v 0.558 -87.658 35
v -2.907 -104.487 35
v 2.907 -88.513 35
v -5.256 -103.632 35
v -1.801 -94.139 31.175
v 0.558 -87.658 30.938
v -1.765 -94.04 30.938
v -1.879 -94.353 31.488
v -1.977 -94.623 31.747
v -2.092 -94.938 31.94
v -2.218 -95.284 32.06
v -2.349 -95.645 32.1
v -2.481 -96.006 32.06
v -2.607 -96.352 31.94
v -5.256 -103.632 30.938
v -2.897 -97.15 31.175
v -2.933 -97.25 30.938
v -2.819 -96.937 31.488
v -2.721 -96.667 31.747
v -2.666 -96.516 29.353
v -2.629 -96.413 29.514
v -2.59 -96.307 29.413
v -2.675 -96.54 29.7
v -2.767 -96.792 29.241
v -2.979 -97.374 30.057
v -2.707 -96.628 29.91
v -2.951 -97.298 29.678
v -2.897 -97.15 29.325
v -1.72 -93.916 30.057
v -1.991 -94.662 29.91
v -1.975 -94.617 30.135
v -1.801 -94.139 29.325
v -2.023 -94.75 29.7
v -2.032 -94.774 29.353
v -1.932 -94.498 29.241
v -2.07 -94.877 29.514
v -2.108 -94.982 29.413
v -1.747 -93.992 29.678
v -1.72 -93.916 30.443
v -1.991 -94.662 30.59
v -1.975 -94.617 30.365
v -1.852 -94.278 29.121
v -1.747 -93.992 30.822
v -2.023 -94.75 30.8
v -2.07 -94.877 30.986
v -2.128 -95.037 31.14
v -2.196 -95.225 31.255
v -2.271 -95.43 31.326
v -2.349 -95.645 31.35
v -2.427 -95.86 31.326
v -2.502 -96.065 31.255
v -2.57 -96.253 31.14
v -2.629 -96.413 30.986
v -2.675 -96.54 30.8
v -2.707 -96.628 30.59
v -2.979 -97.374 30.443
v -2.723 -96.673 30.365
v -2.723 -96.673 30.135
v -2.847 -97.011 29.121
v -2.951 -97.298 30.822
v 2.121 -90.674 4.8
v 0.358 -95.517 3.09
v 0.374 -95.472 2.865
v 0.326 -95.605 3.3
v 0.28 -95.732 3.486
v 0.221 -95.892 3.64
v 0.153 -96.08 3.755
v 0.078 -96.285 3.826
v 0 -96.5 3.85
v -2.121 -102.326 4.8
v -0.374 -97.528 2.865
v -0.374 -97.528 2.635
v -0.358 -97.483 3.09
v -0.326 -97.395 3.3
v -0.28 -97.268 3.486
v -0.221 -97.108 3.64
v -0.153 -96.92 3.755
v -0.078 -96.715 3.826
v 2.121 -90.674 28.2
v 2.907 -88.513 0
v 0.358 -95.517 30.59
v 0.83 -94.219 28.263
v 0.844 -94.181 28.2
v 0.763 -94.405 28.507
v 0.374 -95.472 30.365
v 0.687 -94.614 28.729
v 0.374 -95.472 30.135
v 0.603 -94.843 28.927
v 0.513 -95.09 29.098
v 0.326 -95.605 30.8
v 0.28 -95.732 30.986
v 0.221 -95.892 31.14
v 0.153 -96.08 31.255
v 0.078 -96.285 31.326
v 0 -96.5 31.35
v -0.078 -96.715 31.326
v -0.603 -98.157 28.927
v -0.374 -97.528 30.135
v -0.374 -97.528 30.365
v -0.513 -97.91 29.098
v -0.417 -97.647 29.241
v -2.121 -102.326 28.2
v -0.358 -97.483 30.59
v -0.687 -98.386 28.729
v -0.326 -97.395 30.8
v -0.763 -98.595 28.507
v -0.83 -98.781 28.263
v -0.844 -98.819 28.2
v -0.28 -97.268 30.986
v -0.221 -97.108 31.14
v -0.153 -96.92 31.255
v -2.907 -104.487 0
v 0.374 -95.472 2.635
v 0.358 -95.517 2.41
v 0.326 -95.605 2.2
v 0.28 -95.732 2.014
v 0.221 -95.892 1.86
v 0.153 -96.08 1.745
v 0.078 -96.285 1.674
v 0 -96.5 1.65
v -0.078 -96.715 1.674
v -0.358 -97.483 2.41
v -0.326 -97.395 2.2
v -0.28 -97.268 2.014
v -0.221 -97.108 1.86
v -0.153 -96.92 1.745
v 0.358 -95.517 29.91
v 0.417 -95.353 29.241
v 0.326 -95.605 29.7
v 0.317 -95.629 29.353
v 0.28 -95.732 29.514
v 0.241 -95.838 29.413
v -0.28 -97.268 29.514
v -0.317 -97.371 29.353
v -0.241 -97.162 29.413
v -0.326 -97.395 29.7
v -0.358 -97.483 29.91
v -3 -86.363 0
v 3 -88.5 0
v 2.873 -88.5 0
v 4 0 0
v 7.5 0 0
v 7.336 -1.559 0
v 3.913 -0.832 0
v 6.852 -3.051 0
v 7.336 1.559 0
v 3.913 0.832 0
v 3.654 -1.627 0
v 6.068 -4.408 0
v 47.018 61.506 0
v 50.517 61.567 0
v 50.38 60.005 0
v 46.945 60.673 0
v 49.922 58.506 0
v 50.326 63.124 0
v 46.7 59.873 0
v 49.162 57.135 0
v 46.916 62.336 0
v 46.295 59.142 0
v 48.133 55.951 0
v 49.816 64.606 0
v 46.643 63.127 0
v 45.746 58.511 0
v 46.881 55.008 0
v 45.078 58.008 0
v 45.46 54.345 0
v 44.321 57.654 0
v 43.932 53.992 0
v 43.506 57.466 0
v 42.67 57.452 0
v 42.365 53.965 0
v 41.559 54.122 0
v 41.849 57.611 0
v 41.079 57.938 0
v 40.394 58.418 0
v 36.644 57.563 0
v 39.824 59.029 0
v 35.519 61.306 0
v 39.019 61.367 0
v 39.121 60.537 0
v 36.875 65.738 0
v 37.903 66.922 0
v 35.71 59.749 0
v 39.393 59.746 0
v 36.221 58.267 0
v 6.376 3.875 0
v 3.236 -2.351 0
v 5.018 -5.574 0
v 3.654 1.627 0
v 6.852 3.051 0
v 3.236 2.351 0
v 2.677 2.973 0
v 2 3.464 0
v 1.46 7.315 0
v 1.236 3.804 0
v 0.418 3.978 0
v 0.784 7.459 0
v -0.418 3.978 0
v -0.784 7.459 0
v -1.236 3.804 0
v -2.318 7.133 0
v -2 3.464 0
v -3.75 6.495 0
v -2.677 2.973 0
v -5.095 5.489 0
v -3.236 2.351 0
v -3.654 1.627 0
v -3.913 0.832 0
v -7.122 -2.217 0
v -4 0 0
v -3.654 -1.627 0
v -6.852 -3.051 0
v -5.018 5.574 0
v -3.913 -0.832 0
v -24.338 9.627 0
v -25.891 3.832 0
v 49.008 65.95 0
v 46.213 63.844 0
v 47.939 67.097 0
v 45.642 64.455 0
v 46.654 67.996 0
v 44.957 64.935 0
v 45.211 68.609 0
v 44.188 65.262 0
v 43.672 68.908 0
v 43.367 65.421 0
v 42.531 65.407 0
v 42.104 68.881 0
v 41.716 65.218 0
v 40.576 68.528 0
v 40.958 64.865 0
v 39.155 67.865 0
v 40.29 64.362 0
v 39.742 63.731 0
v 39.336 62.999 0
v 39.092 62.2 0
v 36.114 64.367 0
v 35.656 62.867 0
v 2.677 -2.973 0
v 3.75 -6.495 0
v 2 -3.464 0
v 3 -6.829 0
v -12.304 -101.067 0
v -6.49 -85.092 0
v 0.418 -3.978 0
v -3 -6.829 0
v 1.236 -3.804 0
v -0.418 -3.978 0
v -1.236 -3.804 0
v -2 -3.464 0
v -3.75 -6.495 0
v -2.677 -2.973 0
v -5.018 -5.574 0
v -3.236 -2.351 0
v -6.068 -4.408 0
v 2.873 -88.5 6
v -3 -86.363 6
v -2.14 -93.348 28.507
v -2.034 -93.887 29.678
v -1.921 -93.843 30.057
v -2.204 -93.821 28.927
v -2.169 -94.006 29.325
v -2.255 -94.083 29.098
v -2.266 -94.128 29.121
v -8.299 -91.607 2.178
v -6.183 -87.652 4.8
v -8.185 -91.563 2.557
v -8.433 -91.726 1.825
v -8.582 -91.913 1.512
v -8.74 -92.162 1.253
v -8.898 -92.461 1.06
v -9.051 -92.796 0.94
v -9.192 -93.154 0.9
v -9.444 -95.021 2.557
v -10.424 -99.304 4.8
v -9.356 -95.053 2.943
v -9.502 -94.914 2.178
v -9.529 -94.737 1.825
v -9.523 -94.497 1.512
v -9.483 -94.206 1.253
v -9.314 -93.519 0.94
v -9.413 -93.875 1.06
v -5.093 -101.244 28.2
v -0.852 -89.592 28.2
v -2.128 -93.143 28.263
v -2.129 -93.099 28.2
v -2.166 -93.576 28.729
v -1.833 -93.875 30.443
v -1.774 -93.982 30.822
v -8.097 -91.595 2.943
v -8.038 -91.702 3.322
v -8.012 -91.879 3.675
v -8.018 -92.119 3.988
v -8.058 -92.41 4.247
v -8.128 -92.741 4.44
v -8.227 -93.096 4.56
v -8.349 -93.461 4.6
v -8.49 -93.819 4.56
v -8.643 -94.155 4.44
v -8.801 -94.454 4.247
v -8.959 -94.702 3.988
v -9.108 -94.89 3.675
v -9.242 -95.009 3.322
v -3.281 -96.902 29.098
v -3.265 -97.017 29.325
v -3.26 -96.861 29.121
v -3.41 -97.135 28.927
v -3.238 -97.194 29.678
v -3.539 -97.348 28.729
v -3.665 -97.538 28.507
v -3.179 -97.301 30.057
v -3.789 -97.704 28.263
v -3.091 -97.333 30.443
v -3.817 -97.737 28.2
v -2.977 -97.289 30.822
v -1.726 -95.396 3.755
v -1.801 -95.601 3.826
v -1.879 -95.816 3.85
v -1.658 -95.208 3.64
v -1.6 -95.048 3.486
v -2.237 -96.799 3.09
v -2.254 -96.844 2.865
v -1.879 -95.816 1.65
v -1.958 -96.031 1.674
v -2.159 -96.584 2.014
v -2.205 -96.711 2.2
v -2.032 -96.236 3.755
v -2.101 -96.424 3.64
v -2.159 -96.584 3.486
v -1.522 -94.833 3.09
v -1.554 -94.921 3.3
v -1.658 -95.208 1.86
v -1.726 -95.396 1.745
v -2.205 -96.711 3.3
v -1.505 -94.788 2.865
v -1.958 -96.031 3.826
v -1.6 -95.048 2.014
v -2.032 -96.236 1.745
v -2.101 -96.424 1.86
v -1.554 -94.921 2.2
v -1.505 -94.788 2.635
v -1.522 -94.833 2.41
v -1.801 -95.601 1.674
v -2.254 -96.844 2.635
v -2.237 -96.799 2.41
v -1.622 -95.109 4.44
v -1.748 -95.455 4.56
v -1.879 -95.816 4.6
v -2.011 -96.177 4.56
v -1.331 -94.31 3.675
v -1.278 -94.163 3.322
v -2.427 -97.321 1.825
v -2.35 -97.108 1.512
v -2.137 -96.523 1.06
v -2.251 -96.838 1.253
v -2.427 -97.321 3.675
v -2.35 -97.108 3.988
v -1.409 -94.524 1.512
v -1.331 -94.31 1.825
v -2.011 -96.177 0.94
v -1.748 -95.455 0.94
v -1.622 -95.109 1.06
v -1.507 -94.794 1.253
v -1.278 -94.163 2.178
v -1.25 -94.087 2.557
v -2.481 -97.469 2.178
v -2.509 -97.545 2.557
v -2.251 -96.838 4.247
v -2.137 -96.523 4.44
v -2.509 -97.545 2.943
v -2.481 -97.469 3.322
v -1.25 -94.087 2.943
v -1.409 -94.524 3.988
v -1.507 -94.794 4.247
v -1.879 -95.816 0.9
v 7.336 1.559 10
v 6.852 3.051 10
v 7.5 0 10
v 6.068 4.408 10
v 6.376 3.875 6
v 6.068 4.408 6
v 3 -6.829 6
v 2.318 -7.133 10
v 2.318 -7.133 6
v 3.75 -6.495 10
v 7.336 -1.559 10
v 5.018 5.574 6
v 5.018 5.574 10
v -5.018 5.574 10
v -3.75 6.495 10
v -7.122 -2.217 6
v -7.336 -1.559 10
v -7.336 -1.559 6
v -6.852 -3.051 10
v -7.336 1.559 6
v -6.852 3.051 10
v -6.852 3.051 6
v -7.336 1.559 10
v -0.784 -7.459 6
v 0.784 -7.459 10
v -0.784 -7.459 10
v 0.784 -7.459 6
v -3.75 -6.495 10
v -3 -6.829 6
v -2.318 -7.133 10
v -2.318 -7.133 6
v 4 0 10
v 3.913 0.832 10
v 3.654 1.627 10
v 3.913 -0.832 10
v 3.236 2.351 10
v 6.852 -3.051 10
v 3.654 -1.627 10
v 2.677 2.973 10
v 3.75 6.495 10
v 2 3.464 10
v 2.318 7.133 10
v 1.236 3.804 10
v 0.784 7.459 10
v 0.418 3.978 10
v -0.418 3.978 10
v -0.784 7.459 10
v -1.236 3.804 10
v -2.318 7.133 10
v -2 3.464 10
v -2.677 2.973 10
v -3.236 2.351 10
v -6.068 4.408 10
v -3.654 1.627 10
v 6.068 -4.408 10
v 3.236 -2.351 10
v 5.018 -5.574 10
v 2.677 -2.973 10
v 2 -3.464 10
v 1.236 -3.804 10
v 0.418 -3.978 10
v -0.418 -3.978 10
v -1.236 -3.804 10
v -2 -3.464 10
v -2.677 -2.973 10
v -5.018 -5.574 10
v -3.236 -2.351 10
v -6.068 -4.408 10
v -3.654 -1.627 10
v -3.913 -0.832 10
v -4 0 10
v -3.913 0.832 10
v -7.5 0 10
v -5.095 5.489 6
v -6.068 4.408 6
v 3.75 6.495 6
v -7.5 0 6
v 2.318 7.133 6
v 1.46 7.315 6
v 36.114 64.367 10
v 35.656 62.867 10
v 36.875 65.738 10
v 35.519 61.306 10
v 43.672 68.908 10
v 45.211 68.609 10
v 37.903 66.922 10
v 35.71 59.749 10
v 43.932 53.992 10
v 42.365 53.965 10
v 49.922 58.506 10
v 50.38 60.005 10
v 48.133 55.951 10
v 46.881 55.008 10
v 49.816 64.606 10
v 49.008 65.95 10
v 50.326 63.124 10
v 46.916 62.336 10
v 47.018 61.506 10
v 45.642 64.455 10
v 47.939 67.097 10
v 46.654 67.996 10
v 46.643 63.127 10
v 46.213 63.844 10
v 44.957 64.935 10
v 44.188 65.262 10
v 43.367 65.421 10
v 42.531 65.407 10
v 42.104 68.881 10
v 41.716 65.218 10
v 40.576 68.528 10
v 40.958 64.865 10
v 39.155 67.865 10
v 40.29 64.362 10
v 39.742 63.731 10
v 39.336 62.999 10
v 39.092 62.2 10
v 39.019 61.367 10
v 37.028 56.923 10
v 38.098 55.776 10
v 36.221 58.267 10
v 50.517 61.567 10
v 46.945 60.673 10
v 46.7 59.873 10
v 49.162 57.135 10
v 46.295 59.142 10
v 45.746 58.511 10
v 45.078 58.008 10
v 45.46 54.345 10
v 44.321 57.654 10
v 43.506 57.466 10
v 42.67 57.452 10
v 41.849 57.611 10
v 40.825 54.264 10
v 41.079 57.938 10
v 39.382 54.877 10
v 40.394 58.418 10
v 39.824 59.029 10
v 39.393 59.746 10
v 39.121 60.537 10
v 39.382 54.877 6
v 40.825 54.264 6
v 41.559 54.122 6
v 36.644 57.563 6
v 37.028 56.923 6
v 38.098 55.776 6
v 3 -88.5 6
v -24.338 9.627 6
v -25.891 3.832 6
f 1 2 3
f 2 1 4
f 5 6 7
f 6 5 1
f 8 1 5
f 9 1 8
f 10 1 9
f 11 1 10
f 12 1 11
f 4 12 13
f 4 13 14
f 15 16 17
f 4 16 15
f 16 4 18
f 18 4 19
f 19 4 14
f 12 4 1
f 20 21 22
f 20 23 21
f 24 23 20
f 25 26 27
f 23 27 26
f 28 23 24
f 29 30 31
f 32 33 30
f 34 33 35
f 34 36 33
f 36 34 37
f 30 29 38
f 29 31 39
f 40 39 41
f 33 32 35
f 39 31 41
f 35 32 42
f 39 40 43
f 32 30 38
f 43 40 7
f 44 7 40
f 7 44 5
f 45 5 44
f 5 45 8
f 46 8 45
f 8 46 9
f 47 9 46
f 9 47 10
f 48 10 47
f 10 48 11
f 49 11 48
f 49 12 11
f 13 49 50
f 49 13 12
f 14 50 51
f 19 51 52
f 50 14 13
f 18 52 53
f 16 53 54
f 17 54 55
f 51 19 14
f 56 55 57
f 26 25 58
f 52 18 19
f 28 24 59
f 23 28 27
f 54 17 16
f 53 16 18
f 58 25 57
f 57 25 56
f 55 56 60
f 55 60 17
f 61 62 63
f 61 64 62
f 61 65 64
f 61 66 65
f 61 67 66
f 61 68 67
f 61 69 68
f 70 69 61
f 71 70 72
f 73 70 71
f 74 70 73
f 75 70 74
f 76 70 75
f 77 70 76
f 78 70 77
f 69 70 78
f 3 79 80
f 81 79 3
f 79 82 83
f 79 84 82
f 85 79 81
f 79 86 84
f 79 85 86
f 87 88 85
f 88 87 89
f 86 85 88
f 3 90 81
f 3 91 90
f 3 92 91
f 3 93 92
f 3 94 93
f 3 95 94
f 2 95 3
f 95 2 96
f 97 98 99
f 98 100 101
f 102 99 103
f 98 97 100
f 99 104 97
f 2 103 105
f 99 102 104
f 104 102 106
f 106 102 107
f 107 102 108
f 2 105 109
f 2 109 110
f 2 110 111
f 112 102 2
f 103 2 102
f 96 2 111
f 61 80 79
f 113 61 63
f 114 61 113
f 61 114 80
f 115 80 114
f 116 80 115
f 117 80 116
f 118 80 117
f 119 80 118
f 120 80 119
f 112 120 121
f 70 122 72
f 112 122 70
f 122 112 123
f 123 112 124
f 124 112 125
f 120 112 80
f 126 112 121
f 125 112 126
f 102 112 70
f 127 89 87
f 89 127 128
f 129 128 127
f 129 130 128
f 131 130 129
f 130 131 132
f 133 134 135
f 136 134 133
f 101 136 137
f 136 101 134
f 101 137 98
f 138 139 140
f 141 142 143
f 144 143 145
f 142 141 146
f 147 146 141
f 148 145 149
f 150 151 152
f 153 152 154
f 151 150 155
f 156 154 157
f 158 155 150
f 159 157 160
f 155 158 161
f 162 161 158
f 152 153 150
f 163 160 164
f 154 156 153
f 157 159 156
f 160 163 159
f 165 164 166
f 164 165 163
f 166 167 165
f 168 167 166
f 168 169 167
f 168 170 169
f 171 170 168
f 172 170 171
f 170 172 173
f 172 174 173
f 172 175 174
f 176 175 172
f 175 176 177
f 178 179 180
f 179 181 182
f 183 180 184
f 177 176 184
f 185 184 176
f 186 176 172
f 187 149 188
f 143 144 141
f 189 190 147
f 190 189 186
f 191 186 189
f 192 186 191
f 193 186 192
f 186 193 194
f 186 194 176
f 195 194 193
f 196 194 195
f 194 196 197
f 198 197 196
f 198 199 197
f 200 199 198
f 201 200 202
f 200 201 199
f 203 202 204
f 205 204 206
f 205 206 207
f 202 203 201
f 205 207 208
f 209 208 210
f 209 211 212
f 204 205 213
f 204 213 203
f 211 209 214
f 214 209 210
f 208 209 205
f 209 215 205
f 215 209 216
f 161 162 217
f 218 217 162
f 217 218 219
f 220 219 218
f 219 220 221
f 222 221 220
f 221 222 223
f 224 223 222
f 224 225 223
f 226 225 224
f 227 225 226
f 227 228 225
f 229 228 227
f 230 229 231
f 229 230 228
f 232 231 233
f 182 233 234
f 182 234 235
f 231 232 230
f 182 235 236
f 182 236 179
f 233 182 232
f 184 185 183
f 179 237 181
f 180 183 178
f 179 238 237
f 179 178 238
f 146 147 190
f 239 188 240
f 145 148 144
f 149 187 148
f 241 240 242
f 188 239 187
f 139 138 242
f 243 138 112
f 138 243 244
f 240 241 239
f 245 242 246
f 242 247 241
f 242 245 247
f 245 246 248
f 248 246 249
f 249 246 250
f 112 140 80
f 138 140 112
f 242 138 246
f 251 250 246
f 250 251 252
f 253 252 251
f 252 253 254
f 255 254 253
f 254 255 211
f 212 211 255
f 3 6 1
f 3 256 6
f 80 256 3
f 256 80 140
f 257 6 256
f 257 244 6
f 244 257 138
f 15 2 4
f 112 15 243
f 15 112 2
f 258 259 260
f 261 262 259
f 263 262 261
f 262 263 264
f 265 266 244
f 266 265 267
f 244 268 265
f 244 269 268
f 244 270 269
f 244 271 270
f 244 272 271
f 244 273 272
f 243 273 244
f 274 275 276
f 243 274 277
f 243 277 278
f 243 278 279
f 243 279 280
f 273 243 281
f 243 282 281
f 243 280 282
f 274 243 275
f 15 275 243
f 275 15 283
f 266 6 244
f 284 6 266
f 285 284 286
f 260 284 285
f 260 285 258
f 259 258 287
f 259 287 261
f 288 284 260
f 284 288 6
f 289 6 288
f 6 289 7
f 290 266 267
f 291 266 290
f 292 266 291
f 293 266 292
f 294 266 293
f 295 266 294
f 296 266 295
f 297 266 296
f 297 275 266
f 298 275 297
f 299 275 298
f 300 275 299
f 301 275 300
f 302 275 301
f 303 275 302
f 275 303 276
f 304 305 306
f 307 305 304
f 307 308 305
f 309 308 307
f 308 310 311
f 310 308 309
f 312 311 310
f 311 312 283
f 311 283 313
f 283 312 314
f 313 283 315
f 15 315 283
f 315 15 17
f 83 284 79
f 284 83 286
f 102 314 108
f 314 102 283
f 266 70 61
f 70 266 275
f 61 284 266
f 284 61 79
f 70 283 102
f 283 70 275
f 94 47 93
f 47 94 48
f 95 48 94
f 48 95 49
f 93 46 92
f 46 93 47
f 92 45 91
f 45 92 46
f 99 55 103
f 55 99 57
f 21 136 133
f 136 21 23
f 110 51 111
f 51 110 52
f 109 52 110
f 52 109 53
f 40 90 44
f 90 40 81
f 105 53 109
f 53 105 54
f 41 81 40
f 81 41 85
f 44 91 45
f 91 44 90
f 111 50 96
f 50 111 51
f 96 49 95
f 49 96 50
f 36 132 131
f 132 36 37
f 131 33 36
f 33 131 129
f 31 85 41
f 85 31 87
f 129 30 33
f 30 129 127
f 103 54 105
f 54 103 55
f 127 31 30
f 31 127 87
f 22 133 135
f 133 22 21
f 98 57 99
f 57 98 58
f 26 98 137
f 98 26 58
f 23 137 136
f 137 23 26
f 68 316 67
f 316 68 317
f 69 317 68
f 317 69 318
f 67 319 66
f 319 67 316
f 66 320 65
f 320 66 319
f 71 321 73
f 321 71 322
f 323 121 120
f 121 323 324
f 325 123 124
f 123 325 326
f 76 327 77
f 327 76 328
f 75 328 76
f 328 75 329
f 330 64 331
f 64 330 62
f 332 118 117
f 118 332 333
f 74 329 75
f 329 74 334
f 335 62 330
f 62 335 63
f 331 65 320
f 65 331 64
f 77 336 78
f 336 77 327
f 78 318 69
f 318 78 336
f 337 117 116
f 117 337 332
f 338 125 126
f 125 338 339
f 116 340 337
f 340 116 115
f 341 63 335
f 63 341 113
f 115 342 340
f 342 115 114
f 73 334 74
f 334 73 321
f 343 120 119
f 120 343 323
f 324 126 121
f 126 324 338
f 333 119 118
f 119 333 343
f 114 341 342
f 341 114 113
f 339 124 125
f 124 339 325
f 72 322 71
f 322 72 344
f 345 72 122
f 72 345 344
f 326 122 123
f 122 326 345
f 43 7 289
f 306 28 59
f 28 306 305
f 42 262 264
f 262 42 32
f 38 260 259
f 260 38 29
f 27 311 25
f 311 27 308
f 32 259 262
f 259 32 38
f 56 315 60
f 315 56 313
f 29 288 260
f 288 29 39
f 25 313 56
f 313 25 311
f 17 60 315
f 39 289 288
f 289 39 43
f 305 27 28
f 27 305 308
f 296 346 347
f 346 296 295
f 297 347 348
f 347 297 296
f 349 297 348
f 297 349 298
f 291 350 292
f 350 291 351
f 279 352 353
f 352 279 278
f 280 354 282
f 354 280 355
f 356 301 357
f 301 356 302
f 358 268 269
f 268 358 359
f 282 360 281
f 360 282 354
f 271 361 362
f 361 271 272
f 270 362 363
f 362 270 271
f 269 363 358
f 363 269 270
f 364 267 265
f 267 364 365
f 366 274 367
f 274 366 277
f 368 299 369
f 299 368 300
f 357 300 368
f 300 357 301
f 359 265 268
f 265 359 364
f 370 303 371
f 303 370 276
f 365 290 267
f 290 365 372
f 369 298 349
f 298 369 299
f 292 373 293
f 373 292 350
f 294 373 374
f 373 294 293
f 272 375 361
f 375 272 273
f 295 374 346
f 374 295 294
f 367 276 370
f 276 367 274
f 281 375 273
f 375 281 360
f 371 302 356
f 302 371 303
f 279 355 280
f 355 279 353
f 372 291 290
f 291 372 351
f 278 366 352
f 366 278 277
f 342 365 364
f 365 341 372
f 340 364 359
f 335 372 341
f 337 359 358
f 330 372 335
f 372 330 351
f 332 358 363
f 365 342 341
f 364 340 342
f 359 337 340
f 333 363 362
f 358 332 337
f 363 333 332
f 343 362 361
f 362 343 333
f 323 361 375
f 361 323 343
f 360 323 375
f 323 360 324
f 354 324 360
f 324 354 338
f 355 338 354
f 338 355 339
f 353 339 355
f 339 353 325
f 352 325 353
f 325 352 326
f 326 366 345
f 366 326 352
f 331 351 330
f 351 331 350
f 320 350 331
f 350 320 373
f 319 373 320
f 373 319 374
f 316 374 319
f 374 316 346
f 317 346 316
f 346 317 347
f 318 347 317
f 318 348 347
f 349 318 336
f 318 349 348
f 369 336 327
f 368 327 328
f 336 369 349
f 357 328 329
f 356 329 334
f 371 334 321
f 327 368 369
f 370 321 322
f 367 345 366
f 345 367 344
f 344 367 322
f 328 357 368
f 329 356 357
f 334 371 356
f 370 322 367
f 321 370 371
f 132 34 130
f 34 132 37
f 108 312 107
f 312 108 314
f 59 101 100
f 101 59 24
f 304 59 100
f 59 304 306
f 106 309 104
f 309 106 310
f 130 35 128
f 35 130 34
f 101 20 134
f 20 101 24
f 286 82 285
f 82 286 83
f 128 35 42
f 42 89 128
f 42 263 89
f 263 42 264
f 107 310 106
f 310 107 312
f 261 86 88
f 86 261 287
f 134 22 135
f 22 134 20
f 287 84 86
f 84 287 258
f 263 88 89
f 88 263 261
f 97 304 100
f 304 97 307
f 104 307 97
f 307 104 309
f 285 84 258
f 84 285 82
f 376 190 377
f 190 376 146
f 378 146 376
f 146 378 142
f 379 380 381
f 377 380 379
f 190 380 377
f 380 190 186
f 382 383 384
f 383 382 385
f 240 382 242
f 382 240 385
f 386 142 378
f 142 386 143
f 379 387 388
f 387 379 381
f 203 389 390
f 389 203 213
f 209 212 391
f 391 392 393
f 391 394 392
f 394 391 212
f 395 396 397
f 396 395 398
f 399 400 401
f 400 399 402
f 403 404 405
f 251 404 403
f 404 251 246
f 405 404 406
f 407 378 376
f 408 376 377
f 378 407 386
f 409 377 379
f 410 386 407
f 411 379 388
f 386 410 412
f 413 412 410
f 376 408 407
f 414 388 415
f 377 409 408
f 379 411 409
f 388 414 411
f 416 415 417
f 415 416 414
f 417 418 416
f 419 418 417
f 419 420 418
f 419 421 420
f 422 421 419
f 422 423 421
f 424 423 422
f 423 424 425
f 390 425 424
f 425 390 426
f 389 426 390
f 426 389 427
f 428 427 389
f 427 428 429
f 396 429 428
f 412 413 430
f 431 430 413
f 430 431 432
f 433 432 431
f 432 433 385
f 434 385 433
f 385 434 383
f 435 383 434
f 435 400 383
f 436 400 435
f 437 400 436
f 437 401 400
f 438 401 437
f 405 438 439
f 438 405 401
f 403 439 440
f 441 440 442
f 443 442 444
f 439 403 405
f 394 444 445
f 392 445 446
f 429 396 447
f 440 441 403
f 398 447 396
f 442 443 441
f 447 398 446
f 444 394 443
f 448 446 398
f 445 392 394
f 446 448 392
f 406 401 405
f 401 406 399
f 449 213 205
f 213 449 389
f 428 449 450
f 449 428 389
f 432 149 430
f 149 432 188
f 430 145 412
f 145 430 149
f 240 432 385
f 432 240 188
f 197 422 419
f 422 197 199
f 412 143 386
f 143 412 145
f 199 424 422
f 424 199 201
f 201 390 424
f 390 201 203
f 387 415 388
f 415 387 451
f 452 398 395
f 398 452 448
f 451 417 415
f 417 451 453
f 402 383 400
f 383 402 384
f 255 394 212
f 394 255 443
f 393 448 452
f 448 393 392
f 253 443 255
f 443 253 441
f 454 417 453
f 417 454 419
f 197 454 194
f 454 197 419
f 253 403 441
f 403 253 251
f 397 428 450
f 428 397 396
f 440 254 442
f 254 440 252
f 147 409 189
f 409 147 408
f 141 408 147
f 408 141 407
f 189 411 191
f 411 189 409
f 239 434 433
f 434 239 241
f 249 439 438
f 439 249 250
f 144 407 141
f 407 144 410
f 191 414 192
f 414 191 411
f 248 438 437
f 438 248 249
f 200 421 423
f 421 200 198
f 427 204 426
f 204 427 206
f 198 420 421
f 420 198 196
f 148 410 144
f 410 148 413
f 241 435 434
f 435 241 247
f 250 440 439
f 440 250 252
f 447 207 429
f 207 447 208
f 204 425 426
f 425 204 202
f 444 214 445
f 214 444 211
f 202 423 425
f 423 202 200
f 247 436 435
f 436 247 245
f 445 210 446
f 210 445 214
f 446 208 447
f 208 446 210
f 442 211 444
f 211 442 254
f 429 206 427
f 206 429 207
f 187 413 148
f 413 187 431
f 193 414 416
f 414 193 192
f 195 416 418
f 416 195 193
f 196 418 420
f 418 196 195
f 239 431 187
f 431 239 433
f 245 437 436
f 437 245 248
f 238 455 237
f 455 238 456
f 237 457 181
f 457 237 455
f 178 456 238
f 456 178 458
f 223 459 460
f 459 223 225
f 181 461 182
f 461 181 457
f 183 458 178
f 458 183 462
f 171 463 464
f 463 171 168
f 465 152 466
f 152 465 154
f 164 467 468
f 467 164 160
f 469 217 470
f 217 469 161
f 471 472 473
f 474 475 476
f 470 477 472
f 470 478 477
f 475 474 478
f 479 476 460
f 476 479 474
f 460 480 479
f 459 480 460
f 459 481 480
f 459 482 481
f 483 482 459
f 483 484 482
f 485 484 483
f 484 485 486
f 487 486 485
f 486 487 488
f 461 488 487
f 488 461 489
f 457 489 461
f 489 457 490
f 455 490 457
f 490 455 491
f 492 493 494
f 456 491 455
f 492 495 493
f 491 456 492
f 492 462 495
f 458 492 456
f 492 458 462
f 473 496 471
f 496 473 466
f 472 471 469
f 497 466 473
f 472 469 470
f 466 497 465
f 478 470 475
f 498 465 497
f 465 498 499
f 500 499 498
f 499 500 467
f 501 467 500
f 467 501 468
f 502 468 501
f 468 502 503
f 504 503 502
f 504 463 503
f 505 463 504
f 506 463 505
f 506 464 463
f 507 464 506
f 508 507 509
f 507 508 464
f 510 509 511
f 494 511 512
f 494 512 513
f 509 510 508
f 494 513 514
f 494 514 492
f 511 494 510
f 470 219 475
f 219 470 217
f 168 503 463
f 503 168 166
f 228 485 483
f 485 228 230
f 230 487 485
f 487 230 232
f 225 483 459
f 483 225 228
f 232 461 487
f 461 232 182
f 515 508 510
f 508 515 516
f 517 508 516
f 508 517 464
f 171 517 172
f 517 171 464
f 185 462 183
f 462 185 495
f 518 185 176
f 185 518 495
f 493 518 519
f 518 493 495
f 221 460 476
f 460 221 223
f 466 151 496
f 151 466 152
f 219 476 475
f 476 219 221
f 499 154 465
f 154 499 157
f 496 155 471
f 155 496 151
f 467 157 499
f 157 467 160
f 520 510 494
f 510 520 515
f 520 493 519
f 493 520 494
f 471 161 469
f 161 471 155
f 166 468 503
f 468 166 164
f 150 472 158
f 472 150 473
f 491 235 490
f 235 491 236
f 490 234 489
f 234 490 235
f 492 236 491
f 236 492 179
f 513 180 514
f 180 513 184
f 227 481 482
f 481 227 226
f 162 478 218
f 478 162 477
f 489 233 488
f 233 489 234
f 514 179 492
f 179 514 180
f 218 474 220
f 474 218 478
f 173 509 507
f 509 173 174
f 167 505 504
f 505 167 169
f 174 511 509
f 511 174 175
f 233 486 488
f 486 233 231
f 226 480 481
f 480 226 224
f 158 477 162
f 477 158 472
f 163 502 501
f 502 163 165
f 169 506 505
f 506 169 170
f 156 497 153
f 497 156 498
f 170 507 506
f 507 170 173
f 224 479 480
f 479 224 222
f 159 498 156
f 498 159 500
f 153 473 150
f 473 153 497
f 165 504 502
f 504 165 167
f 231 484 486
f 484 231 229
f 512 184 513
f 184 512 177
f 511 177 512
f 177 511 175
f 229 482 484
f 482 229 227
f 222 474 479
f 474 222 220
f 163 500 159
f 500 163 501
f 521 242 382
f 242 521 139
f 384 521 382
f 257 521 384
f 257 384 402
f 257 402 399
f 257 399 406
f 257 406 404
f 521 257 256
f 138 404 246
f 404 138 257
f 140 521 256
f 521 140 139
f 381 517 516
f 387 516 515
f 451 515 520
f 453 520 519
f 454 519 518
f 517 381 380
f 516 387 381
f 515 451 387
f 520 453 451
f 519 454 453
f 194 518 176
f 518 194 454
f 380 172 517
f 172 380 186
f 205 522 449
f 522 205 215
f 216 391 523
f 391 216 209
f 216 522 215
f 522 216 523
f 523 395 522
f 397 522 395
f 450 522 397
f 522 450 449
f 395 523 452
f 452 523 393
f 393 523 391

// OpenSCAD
$fn=30;

translate([0,-96.5,16.5])rotate([0,-90,-20])
servo_bracket();

translate([-3,-88.5,0])cube([6,84.5,6]);

difference(){
cylinder(d=15,h=10);
translate([0,0,-1])cylinder(d=8,h=12);
}

rotate([0,0,145])
translate([-3,-70,0])cube([6,64.5,6]);

rotate([0,0,145])translate([0,-75,0])
difference(){
cylinder(d=15,h=10);
translate([0,0,-1])cylinder(d=8,h=12);
}

rotate([0,0,75]) translate([0,6,0])
linear_extrude(height=6)
polygon([[-4,0],[4,0],[3,20],[-3,20]]);

module servo_bracket(){
difference(){
union(){
translate([1,0,1.25])cube([35,17,2.5],center=true);
translate([0,8.5,2])
rotate([90,0,0])linear_extrude(height=17)
polygon([[-16.5,0],[16.5,0],[-16.5,8]]);
translate([13.75,0,0])cylinder(d=8,h=2,$fn=60);
}
cube([23.4,12.4,50],center=true);
translate([13.75,0,-1])cylinder(d=2.2,h=5,$fn=30);
translate([-13.75,0,-1])cylinder(d=2.2,h=50,$fn=30);
translate([13.75,0,2.5])cylinder(d=3.7,h=5,$fn=30);
translate([-13.75,0,2])cylinder(d=3.7,h=50,$fn=30);
translate([10,0,0])cylinder(d=6,h=12,$fn=60);
}
}
